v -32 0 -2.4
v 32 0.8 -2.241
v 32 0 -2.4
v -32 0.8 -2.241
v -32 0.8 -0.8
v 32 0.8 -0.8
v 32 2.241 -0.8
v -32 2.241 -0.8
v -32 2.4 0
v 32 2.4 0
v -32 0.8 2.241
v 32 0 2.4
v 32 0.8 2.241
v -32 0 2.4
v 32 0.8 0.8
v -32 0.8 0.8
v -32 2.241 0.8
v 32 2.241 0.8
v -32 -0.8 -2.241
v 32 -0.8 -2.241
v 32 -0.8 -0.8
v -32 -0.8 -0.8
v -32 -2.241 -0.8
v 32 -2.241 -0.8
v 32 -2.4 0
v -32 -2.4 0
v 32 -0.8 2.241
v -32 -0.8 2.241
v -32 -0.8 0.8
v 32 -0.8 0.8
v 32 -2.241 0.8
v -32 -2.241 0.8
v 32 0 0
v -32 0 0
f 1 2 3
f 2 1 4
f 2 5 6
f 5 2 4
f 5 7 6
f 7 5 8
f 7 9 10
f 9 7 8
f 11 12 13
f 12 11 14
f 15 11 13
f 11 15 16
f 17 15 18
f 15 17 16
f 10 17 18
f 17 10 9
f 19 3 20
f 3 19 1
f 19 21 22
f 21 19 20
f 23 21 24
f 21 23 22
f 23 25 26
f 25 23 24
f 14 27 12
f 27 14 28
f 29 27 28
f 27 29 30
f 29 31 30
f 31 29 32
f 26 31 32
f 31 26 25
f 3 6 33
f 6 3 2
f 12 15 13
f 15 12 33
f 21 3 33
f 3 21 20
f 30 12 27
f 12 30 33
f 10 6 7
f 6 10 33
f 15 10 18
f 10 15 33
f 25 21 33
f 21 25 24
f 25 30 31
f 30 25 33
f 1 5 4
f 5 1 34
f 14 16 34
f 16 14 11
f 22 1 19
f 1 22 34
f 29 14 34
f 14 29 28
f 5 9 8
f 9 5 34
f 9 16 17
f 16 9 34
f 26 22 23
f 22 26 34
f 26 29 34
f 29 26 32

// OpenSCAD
// file: ../p/axle.scad
use <../lib.scad>
function ldraw_lib__axle() = [
// 0 Technic Axle
// 0 Name: axle.dat
// 0 Author: James Jessiman
// 0 !LDRAW_ORG Primitive UPDATE 2024-02
// 0 !LICENSE Licensed under CC BY 4.0 : see CAreadme.txt
// 
// 0 BFC CERTIFY CCW
  [0,"BFC","CERTIFY"],
  [0,"BFC","CCW"],
// 
// 0 !HISTORY 2000-04-23 [sbliss] Added conditional edges along outermost diameters
// 0 !HISTORY 2000-05-07 [PTadmin] Official Update 2000-01
// 0 !HISTORY 2002-11-08 [OrionP] Adjusted fit and precision
// 0 !HISTORY 2003-03-12 [PTadmin] Official Update 2003-01
// 0 !HISTORY 2007-06-24 [PTadmin] Header formatted for Contributor Agreement
// 0 !HISTORY 2008-07-01 [PTadmin] Official Update 2008-01
// 0 !HISTORY 2024-02-06 [Holly-Wood] Added 'Technic' to the description
// 0 !HISTORY 2024-03-24 [OrionP] Official Update 2024-02
// 
// 5 24 6 0 0 6 1 0 5.602 0 2 5.602 0 -2
  [5,24,6,0,0,6,1,0,5.602,0,2,5.602,0,-2],
// 5 24 0 0 6 0 1 6 2 0 5.602 -2 0 5.602
  [5,24,0,0,6,0,1,6,2,0,5.602,-2,0,5.602],
// 5 24 -6 0 0 -6 1 0 -5.602 0 -2 -5.602 0 2
  [5,24,-6,0,0,-6,1,0,-5.602,0,-2,-5.602,0,2],
// 5 24 0 0 -6 0 1 -6 -2 0 -5.602 2 0 -5.602
  [5,24,0,0,-6,0,1,-6,-2,0,-5.602,2,0,-5.602],
// 
// 2 24 6 0 0 5.602 0 2
  [2,24,6,0,0,5.602,0,2],
// 2 24 5.602 0 2 2 0 2
  [2,24,5.602,0,2,2,0,2],
// 2 24 2 0 2 2 0 5.602
  [2,24,2,0,2,2,0,5.602],
// 2 24 2 0 5.602 0 0 6
  [2,24,2,0,5.602,0,0,6],
// 2 24 -6 0 0 -5.602 0 2
  [2,24,-6,0,0,-5.602,0,2],
// 2 24 -5.602 0 2 -2 0 2
  [2,24,-5.602,0,2,-2,0,2],
// 2 24 -2 0 2 -2 0 5.602
  [2,24,-2,0,2,-2,0,5.602],
// 2 24 -2 0 5.602 -0 0 6
  [2,24,-2,0,5.602,-0,0,6],
// 2 24 6 0 -0 5.602 0 -2
  [2,24,6,0,-0,5.602,0,-2],
// 2 24 5.602 0 -2 2 0 -2
  [2,24,5.602,0,-2,2,0,-2],
// 2 24 2 0 -2 2 0 -5.602
  [2,24,2,0,-2,2,0,-5.602],
// 2 24 2 0 -5.602 0 0 -6
  [2,24,2,0,-5.602,0,0,-6],
// 2 24 -6 0 -0 -5.602 0 -2
  [2,24,-6,0,-0,-5.602,0,-2],
// 2 24 -5.602 0 -2 -2 0 -2
  [2,24,-5.602,0,-2,-2,0,-2],
// 2 24 -2 0 -2 -2 0 -5.602
  [2,24,-2,0,-2,-2,0,-5.602],
// 2 24 -2 0 -5.602 -0 0 -6
  [2,24,-2,0,-5.602,-0,0,-6],
// 2 24 6 1 0 5.602 1 2
  [2,24,6,1,0,5.602,1,2],
// 2 24 5.602 1 2 2 1 2
  [2,24,5.602,1,2,2,1,2],
// 2 24 2 1 2 2 1 5.602
  [2,24,2,1,2,2,1,5.602],
// 2 24 2 1 5.602 0 1 6
  [2,24,2,1,5.602,0,1,6],
// 2 24 -6 1 0 -5.602 1 2
  [2,24,-6,1,0,-5.602,1,2],
// 2 24 -5.602 1 2 -2 1 2
  [2,24,-5.602,1,2,-2,1,2],
// 2 24 -2 1 2 -2 1 5.602
  [2,24,-2,1,2,-2,1,5.602],
// 2 24 -2 1 5.602 -0 1 6
  [2,24,-2,1,5.602,-0,1,6],
// 2 24 6 1 -0 5.602 1 -2
  [2,24,6,1,-0,5.602,1,-2],
// 2 24 5.602 1 -2 2 1 -2
  [2,24,5.602,1,-2,2,1,-2],
// 2 24 2 1 -2 2 1 -5.602
  [2,24,2,1,-2,2,1,-5.602],
// 2 24 2 1 -5.602 0 1 -6
  [2,24,2,1,-5.602,0,1,-6],
// 2 24 -6 1 -0 -5.602 1 -2
  [2,24,-6,1,-0,-5.602,1,-2],
// 2 24 -5.602 1 -2 -2 1 -2
  [2,24,-5.602,1,-2,-2,1,-2],
// 2 24 -2 1 -2 -2 1 -5.602
  [2,24,-2,1,-2,-2,1,-5.602],
// 2 24 -2 1 -5.602 -0 1 -6
  [2,24,-2,1,-5.602,-0,1,-6],
// 
// 2 24 5.602 0 2 5.602 1 2
  [2,24,5.602,0,2,5.602,1,2],
// 2 24 2 0 2 2 1 2
  [2,24,2,0,2,2,1,2],
// 2 24 2 0 5.602 2 1 5.602
  [2,24,2,0,5.602,2,1,5.602],
// 2 24 -5.602 0 2 -5.602 1 2
  [2,24,-5.602,0,2,-5.602,1,2],
// 2 24 -2 0 2 -2 1 2
  [2,24,-2,0,2,-2,1,2],
// 2 24 -2 0 5.602 -2 1 5.602
  [2,24,-2,0,5.602,-2,1,5.602],
// 2 24 5.602 0 -2 5.602 1 -2
  [2,24,5.602,0,-2,5.602,1,-2],
// 2 24 2 0 -2 2 1 -2
  [2,24,2,0,-2,2,1,-2],
// 2 24 2 0 -5.602 2 1 -5.602
  [2,24,2,0,-5.602,2,1,-5.602],
// 2 24 -5.602 0 -2 -5.602 1 -2
  [2,24,-5.602,0,-2,-5.602,1,-2],
// 2 24 -2 0 -2 -2 1 -2
  [2,24,-2,0,-2,-2,1,-2],
// 2 24 -2 0 -5.602 -2 1 -5.602
  [2,24,-2,0,-5.602,-2,1,-5.602],
// 
// 4 16 6 0 0 6 1 0 5.602 1 2 5.602 0 2
  [4,16,6,0,0,6,1,0,5.602,1,2,5.602,0,2],
// 4 16 5.602 0 2 5.602 1 2 2 1 2 2 0 2
  [4,16,5.602,0,2,5.602,1,2,2,1,2,2,0,2],
// 4 16 2 0 2 2 1 2 2 1 5.602 2 0 5.602
  [4,16,2,0,2,2,1,2,2,1,5.602,2,0,5.602],
// 4 16 2 0 5.602 2 1 5.602 0 1 6 0 0 6
  [4,16,2,0,5.602,2,1,5.602,0,1,6,0,0,6],
// 4 16 -6 0 0 -5.602 0 2 -5.602 1 2 -6 1 0
  [4,16,-6,0,0,-5.602,0,2,-5.602,1,2,-6,1,0],
// 4 16 -5.602 0 2 -2 0 2 -2 1 2 -5.602 1 2
  [4,16,-5.602,0,2,-2,0,2,-2,1,2,-5.602,1,2],
// 4 16 -2 0 2 -2 0 5.602 -2 1 5.602 -2 1 2
  [4,16,-2,0,2,-2,0,5.602,-2,1,5.602,-2,1,2],
// 4 16 -2 0 5.602 -0 0 6 -0 1 6 -2 1 5.602
  [4,16,-2,0,5.602,-0,0,6,-0,1,6,-2,1,5.602],
// 4 16 6 0 -0 5.602 0 -2 5.602 1 -2 6 1 -0
  [4,16,6,0,-0,5.602,0,-2,5.602,1,-2,6,1,-0],
// 4 16 5.602 0 -2 2 0 -2 2 1 -2 5.602 1 -2
  [4,16,5.602,0,-2,2,0,-2,2,1,-2,5.602,1,-2],
// 4 16 2 0 -2 2 0 -5.602 2 1 -5.602 2 1 -2
  [4,16,2,0,-2,2,0,-5.602,2,1,-5.602,2,1,-2],
// 4 16 2 0 -5.602 0 0 -6 0 1 -6 2 1 -5.602
  [4,16,2,0,-5.602,0,0,-6,0,1,-6,2,1,-5.602],
// 4 16 -6 0 -0 -6 1 -0 -5.602 1 -2 -5.602 0 -2
  [4,16,-6,0,-0,-6,1,-0,-5.602,1,-2,-5.602,0,-2],
// 4 16 -5.602 0 -2 -5.602 1 -2 -2 1 -2 -2 0 -2
  [4,16,-5.602,0,-2,-5.602,1,-2,-2,1,-2,-2,0,-2],
// 4 16 -2 0 -2 -2 1 -2 -2 1 -5.602 -2 0 -5.602
  [4,16,-2,0,-2,-2,1,-2,-2,1,-5.602,-2,0,-5.602],
// 4 16 -2 0 -5.602 -2 1 -5.602 -0 1 -6 -0 0 -6
  [4,16,-2,0,-5.602,-2,1,-5.602,-0,1,-6,-0,0,-6],
// 
// 4 16 6 0 0 5.602 0 2 2 0 2 0 0 0
  [4,16,6,0,0,5.602,0,2,2,0,2,0,0,0],
// 4 16 -6 0 0 0 0 0 -2 0 2 -5.602 0 2
  [4,16,-6,0,0,0,0,0,-2,0,2,-5.602,0,2],
// 4 16 6 0 0 0 0 0 2 0 -2 5.602 0 -2
  [4,16,6,0,0,0,0,0,2,0,-2,5.602,0,-2],
// 4 16 -6 0 0 -5.602 0 -2 -2 0 -2 0 0 0
  [4,16,-6,0,0,-5.602,0,-2,-2,0,-2,0,0,0],
// 4 16 0 0 6 0 0 0 2 0 2 2 0 5.602
  [4,16,0,0,6,0,0,0,2,0,2,2,0,5.602],
// 4 16 0 0 6 -2 0 5.602 -2 0 2 0 0 0
  [4,16,0,0,6,-2,0,5.602,-2,0,2,0,0,0],
// 4 16 0 0 -6 2 0 -5.602 2 0 -2 0 0 0
  [4,16,0,0,-6,2,0,-5.602,2,0,-2,0,0,0],
// 4 16 0 0 -6 0 0 0 -2 0 -2 -2 0 -5.602
  [4,16,0,0,-6,0,0,0,-2,0,-2,-2,0,-5.602],
// 4 16 6 1 0 0 1 0 2 1 2 5.602 1 2
  [4,16,6,1,0,0,1,0,2,1,2,5.602,1,2],
// 4 16 -6 1 0 -5.602 1 2 -2 1 2 0 1 0
  [4,16,-6,1,0,-5.602,1,2,-2,1,2,0,1,0],
// 4 16 6 1 0 5.602 1 -2 2 1 -2 0 1 0
  [4,16,6,1,0,5.602,1,-2,2,1,-2,0,1,0],
// 4 16 -6 1 0 0 1 0 -2 1 -2 -5.602 1 -2
  [4,16,-6,1,0,0,1,0,-2,1,-2,-5.602,1,-2],
// 4 16 0 1 6 2 1 5.602 2 1 2 0 1 0
  [4,16,0,1,6,2,1,5.602,2,1,2,0,1,0],
// 4 16 0 1 6 0 1 0 -2 1 2 -2 1 5.602
  [4,16,0,1,6,0,1,0,-2,1,2,-2,1,5.602],
// 4 16 0 1 -6 0 1 0 2 1 -2 2 1 -5.602
  [4,16,0,1,-6,0,1,0,2,1,-2,2,1,-5.602],
// 4 16 0 1 -6 -2 1 -5.602 -2 1 -2 0 1 0
  [4,16,0,1,-6,-2,1,-5.602,-2,1,-2,0,1,0],
];
module ldraw_lib__axle(step=0, col=false, unit=2/5, alt=false, line=0.2, solid=!$preview)
    makepoly(ldraw_lib__axle(), step=step, col=col, unit=unit, alt=alt, line=line, solid=solid);
ldraw_lib__axle(line=0.2);
// file: 3707.scad
use <../lib.scad>
use <../p/axle.scad>
function ldraw_lib__3707() = [
// 0 Technic Axle  8
// 0 Name: 3707.dat
// 0 Author: James Jessiman
// 0 !LDRAW_ORG Part UPDATE 2005-01
// 0 !LICENSE Licensed under CC BY 4.0 : see CAreadme.txt
// 
// 0 BFC CERTIFY CCW
  [0,"BFC","CERTIFY"],
  [0,"BFC","CCW"],
// 
// 0 !HISTORY 2004-07-11 [guyvivan] BFC'ed
// 0 !HISTORY 2005-12-28 [PTadmin] Official Update 2005-01
// 0 !HISTORY 2007-06-29 [PTadmin] Header formatted for Contributor Agreement
// 0 !HISTORY 2008-07-01 [PTadmin] Official Update 2008-01
// 
// 
// 1 16 80 0 0 0 -160 0 1 0 0 0 0 1 axle.dat
  [1,16,80,0,0,0,-160,0,1,0,0,0,0,1, ldraw_lib__axle()],
// 0
// 
];
module ldraw_lib__3707(step=0, col=false, unit=2/5, alt=false, line=0.2, solid=!$preview)
    makepoly(ldraw_lib__3707(), step=step, col=col, unit=unit, alt=alt, line=line, solid=solid);
ldraw_lib__3707(line=0.2);
// main file
use <../lib.scad>
use <3707.scad>
function ldraw_lib__370726() = [
// 0 ~_Technic Axle  8 Black (Obsolete)
// 0 Name: 370726.dat
// 0 Author: Michael Heidemann [mikeheide]
// 0 !LDRAW_ORG Part Physical_Colour UPDATE 2019-02
// 0 !LICENSE Licensed under CC BY 4.0 : see CAreadme.txt
// 
// 0 BFC CERTIFY CCW
  [0,"BFC","CERTIFY"],
  [0,"BFC","CCW"],
// 
// 0 !CATEGORY Obsolete
// 
// 0 !HISTORY 2010-12-31 [PTadmin] Official Update 2010-03
// 0 !HISTORY 2019-07-23 [Holly-Wood] Obsoleted per decision not to include physical colour parts
// 0 !HISTORY 2019-09-09 [PTadmin] Official Update 2019-02
// 
// 
// 1 0 0 0 0 1 0 0 0 1 0 0 0 1 3707.dat
  [1,0,0,0,0,1,0,0,0,1,0,0,0,1, ldraw_lib__3707()],
];
module ldraw_lib__370726(step=0, col=false, unit=2/5, alt=false, line=0.2, solid=!$preview)
    makepoly(ldraw_lib__370726(), step=step, col=col, unit=unit, alt=alt, line=line, solid=solid);
ldraw_lib__370726(line=0.2);
